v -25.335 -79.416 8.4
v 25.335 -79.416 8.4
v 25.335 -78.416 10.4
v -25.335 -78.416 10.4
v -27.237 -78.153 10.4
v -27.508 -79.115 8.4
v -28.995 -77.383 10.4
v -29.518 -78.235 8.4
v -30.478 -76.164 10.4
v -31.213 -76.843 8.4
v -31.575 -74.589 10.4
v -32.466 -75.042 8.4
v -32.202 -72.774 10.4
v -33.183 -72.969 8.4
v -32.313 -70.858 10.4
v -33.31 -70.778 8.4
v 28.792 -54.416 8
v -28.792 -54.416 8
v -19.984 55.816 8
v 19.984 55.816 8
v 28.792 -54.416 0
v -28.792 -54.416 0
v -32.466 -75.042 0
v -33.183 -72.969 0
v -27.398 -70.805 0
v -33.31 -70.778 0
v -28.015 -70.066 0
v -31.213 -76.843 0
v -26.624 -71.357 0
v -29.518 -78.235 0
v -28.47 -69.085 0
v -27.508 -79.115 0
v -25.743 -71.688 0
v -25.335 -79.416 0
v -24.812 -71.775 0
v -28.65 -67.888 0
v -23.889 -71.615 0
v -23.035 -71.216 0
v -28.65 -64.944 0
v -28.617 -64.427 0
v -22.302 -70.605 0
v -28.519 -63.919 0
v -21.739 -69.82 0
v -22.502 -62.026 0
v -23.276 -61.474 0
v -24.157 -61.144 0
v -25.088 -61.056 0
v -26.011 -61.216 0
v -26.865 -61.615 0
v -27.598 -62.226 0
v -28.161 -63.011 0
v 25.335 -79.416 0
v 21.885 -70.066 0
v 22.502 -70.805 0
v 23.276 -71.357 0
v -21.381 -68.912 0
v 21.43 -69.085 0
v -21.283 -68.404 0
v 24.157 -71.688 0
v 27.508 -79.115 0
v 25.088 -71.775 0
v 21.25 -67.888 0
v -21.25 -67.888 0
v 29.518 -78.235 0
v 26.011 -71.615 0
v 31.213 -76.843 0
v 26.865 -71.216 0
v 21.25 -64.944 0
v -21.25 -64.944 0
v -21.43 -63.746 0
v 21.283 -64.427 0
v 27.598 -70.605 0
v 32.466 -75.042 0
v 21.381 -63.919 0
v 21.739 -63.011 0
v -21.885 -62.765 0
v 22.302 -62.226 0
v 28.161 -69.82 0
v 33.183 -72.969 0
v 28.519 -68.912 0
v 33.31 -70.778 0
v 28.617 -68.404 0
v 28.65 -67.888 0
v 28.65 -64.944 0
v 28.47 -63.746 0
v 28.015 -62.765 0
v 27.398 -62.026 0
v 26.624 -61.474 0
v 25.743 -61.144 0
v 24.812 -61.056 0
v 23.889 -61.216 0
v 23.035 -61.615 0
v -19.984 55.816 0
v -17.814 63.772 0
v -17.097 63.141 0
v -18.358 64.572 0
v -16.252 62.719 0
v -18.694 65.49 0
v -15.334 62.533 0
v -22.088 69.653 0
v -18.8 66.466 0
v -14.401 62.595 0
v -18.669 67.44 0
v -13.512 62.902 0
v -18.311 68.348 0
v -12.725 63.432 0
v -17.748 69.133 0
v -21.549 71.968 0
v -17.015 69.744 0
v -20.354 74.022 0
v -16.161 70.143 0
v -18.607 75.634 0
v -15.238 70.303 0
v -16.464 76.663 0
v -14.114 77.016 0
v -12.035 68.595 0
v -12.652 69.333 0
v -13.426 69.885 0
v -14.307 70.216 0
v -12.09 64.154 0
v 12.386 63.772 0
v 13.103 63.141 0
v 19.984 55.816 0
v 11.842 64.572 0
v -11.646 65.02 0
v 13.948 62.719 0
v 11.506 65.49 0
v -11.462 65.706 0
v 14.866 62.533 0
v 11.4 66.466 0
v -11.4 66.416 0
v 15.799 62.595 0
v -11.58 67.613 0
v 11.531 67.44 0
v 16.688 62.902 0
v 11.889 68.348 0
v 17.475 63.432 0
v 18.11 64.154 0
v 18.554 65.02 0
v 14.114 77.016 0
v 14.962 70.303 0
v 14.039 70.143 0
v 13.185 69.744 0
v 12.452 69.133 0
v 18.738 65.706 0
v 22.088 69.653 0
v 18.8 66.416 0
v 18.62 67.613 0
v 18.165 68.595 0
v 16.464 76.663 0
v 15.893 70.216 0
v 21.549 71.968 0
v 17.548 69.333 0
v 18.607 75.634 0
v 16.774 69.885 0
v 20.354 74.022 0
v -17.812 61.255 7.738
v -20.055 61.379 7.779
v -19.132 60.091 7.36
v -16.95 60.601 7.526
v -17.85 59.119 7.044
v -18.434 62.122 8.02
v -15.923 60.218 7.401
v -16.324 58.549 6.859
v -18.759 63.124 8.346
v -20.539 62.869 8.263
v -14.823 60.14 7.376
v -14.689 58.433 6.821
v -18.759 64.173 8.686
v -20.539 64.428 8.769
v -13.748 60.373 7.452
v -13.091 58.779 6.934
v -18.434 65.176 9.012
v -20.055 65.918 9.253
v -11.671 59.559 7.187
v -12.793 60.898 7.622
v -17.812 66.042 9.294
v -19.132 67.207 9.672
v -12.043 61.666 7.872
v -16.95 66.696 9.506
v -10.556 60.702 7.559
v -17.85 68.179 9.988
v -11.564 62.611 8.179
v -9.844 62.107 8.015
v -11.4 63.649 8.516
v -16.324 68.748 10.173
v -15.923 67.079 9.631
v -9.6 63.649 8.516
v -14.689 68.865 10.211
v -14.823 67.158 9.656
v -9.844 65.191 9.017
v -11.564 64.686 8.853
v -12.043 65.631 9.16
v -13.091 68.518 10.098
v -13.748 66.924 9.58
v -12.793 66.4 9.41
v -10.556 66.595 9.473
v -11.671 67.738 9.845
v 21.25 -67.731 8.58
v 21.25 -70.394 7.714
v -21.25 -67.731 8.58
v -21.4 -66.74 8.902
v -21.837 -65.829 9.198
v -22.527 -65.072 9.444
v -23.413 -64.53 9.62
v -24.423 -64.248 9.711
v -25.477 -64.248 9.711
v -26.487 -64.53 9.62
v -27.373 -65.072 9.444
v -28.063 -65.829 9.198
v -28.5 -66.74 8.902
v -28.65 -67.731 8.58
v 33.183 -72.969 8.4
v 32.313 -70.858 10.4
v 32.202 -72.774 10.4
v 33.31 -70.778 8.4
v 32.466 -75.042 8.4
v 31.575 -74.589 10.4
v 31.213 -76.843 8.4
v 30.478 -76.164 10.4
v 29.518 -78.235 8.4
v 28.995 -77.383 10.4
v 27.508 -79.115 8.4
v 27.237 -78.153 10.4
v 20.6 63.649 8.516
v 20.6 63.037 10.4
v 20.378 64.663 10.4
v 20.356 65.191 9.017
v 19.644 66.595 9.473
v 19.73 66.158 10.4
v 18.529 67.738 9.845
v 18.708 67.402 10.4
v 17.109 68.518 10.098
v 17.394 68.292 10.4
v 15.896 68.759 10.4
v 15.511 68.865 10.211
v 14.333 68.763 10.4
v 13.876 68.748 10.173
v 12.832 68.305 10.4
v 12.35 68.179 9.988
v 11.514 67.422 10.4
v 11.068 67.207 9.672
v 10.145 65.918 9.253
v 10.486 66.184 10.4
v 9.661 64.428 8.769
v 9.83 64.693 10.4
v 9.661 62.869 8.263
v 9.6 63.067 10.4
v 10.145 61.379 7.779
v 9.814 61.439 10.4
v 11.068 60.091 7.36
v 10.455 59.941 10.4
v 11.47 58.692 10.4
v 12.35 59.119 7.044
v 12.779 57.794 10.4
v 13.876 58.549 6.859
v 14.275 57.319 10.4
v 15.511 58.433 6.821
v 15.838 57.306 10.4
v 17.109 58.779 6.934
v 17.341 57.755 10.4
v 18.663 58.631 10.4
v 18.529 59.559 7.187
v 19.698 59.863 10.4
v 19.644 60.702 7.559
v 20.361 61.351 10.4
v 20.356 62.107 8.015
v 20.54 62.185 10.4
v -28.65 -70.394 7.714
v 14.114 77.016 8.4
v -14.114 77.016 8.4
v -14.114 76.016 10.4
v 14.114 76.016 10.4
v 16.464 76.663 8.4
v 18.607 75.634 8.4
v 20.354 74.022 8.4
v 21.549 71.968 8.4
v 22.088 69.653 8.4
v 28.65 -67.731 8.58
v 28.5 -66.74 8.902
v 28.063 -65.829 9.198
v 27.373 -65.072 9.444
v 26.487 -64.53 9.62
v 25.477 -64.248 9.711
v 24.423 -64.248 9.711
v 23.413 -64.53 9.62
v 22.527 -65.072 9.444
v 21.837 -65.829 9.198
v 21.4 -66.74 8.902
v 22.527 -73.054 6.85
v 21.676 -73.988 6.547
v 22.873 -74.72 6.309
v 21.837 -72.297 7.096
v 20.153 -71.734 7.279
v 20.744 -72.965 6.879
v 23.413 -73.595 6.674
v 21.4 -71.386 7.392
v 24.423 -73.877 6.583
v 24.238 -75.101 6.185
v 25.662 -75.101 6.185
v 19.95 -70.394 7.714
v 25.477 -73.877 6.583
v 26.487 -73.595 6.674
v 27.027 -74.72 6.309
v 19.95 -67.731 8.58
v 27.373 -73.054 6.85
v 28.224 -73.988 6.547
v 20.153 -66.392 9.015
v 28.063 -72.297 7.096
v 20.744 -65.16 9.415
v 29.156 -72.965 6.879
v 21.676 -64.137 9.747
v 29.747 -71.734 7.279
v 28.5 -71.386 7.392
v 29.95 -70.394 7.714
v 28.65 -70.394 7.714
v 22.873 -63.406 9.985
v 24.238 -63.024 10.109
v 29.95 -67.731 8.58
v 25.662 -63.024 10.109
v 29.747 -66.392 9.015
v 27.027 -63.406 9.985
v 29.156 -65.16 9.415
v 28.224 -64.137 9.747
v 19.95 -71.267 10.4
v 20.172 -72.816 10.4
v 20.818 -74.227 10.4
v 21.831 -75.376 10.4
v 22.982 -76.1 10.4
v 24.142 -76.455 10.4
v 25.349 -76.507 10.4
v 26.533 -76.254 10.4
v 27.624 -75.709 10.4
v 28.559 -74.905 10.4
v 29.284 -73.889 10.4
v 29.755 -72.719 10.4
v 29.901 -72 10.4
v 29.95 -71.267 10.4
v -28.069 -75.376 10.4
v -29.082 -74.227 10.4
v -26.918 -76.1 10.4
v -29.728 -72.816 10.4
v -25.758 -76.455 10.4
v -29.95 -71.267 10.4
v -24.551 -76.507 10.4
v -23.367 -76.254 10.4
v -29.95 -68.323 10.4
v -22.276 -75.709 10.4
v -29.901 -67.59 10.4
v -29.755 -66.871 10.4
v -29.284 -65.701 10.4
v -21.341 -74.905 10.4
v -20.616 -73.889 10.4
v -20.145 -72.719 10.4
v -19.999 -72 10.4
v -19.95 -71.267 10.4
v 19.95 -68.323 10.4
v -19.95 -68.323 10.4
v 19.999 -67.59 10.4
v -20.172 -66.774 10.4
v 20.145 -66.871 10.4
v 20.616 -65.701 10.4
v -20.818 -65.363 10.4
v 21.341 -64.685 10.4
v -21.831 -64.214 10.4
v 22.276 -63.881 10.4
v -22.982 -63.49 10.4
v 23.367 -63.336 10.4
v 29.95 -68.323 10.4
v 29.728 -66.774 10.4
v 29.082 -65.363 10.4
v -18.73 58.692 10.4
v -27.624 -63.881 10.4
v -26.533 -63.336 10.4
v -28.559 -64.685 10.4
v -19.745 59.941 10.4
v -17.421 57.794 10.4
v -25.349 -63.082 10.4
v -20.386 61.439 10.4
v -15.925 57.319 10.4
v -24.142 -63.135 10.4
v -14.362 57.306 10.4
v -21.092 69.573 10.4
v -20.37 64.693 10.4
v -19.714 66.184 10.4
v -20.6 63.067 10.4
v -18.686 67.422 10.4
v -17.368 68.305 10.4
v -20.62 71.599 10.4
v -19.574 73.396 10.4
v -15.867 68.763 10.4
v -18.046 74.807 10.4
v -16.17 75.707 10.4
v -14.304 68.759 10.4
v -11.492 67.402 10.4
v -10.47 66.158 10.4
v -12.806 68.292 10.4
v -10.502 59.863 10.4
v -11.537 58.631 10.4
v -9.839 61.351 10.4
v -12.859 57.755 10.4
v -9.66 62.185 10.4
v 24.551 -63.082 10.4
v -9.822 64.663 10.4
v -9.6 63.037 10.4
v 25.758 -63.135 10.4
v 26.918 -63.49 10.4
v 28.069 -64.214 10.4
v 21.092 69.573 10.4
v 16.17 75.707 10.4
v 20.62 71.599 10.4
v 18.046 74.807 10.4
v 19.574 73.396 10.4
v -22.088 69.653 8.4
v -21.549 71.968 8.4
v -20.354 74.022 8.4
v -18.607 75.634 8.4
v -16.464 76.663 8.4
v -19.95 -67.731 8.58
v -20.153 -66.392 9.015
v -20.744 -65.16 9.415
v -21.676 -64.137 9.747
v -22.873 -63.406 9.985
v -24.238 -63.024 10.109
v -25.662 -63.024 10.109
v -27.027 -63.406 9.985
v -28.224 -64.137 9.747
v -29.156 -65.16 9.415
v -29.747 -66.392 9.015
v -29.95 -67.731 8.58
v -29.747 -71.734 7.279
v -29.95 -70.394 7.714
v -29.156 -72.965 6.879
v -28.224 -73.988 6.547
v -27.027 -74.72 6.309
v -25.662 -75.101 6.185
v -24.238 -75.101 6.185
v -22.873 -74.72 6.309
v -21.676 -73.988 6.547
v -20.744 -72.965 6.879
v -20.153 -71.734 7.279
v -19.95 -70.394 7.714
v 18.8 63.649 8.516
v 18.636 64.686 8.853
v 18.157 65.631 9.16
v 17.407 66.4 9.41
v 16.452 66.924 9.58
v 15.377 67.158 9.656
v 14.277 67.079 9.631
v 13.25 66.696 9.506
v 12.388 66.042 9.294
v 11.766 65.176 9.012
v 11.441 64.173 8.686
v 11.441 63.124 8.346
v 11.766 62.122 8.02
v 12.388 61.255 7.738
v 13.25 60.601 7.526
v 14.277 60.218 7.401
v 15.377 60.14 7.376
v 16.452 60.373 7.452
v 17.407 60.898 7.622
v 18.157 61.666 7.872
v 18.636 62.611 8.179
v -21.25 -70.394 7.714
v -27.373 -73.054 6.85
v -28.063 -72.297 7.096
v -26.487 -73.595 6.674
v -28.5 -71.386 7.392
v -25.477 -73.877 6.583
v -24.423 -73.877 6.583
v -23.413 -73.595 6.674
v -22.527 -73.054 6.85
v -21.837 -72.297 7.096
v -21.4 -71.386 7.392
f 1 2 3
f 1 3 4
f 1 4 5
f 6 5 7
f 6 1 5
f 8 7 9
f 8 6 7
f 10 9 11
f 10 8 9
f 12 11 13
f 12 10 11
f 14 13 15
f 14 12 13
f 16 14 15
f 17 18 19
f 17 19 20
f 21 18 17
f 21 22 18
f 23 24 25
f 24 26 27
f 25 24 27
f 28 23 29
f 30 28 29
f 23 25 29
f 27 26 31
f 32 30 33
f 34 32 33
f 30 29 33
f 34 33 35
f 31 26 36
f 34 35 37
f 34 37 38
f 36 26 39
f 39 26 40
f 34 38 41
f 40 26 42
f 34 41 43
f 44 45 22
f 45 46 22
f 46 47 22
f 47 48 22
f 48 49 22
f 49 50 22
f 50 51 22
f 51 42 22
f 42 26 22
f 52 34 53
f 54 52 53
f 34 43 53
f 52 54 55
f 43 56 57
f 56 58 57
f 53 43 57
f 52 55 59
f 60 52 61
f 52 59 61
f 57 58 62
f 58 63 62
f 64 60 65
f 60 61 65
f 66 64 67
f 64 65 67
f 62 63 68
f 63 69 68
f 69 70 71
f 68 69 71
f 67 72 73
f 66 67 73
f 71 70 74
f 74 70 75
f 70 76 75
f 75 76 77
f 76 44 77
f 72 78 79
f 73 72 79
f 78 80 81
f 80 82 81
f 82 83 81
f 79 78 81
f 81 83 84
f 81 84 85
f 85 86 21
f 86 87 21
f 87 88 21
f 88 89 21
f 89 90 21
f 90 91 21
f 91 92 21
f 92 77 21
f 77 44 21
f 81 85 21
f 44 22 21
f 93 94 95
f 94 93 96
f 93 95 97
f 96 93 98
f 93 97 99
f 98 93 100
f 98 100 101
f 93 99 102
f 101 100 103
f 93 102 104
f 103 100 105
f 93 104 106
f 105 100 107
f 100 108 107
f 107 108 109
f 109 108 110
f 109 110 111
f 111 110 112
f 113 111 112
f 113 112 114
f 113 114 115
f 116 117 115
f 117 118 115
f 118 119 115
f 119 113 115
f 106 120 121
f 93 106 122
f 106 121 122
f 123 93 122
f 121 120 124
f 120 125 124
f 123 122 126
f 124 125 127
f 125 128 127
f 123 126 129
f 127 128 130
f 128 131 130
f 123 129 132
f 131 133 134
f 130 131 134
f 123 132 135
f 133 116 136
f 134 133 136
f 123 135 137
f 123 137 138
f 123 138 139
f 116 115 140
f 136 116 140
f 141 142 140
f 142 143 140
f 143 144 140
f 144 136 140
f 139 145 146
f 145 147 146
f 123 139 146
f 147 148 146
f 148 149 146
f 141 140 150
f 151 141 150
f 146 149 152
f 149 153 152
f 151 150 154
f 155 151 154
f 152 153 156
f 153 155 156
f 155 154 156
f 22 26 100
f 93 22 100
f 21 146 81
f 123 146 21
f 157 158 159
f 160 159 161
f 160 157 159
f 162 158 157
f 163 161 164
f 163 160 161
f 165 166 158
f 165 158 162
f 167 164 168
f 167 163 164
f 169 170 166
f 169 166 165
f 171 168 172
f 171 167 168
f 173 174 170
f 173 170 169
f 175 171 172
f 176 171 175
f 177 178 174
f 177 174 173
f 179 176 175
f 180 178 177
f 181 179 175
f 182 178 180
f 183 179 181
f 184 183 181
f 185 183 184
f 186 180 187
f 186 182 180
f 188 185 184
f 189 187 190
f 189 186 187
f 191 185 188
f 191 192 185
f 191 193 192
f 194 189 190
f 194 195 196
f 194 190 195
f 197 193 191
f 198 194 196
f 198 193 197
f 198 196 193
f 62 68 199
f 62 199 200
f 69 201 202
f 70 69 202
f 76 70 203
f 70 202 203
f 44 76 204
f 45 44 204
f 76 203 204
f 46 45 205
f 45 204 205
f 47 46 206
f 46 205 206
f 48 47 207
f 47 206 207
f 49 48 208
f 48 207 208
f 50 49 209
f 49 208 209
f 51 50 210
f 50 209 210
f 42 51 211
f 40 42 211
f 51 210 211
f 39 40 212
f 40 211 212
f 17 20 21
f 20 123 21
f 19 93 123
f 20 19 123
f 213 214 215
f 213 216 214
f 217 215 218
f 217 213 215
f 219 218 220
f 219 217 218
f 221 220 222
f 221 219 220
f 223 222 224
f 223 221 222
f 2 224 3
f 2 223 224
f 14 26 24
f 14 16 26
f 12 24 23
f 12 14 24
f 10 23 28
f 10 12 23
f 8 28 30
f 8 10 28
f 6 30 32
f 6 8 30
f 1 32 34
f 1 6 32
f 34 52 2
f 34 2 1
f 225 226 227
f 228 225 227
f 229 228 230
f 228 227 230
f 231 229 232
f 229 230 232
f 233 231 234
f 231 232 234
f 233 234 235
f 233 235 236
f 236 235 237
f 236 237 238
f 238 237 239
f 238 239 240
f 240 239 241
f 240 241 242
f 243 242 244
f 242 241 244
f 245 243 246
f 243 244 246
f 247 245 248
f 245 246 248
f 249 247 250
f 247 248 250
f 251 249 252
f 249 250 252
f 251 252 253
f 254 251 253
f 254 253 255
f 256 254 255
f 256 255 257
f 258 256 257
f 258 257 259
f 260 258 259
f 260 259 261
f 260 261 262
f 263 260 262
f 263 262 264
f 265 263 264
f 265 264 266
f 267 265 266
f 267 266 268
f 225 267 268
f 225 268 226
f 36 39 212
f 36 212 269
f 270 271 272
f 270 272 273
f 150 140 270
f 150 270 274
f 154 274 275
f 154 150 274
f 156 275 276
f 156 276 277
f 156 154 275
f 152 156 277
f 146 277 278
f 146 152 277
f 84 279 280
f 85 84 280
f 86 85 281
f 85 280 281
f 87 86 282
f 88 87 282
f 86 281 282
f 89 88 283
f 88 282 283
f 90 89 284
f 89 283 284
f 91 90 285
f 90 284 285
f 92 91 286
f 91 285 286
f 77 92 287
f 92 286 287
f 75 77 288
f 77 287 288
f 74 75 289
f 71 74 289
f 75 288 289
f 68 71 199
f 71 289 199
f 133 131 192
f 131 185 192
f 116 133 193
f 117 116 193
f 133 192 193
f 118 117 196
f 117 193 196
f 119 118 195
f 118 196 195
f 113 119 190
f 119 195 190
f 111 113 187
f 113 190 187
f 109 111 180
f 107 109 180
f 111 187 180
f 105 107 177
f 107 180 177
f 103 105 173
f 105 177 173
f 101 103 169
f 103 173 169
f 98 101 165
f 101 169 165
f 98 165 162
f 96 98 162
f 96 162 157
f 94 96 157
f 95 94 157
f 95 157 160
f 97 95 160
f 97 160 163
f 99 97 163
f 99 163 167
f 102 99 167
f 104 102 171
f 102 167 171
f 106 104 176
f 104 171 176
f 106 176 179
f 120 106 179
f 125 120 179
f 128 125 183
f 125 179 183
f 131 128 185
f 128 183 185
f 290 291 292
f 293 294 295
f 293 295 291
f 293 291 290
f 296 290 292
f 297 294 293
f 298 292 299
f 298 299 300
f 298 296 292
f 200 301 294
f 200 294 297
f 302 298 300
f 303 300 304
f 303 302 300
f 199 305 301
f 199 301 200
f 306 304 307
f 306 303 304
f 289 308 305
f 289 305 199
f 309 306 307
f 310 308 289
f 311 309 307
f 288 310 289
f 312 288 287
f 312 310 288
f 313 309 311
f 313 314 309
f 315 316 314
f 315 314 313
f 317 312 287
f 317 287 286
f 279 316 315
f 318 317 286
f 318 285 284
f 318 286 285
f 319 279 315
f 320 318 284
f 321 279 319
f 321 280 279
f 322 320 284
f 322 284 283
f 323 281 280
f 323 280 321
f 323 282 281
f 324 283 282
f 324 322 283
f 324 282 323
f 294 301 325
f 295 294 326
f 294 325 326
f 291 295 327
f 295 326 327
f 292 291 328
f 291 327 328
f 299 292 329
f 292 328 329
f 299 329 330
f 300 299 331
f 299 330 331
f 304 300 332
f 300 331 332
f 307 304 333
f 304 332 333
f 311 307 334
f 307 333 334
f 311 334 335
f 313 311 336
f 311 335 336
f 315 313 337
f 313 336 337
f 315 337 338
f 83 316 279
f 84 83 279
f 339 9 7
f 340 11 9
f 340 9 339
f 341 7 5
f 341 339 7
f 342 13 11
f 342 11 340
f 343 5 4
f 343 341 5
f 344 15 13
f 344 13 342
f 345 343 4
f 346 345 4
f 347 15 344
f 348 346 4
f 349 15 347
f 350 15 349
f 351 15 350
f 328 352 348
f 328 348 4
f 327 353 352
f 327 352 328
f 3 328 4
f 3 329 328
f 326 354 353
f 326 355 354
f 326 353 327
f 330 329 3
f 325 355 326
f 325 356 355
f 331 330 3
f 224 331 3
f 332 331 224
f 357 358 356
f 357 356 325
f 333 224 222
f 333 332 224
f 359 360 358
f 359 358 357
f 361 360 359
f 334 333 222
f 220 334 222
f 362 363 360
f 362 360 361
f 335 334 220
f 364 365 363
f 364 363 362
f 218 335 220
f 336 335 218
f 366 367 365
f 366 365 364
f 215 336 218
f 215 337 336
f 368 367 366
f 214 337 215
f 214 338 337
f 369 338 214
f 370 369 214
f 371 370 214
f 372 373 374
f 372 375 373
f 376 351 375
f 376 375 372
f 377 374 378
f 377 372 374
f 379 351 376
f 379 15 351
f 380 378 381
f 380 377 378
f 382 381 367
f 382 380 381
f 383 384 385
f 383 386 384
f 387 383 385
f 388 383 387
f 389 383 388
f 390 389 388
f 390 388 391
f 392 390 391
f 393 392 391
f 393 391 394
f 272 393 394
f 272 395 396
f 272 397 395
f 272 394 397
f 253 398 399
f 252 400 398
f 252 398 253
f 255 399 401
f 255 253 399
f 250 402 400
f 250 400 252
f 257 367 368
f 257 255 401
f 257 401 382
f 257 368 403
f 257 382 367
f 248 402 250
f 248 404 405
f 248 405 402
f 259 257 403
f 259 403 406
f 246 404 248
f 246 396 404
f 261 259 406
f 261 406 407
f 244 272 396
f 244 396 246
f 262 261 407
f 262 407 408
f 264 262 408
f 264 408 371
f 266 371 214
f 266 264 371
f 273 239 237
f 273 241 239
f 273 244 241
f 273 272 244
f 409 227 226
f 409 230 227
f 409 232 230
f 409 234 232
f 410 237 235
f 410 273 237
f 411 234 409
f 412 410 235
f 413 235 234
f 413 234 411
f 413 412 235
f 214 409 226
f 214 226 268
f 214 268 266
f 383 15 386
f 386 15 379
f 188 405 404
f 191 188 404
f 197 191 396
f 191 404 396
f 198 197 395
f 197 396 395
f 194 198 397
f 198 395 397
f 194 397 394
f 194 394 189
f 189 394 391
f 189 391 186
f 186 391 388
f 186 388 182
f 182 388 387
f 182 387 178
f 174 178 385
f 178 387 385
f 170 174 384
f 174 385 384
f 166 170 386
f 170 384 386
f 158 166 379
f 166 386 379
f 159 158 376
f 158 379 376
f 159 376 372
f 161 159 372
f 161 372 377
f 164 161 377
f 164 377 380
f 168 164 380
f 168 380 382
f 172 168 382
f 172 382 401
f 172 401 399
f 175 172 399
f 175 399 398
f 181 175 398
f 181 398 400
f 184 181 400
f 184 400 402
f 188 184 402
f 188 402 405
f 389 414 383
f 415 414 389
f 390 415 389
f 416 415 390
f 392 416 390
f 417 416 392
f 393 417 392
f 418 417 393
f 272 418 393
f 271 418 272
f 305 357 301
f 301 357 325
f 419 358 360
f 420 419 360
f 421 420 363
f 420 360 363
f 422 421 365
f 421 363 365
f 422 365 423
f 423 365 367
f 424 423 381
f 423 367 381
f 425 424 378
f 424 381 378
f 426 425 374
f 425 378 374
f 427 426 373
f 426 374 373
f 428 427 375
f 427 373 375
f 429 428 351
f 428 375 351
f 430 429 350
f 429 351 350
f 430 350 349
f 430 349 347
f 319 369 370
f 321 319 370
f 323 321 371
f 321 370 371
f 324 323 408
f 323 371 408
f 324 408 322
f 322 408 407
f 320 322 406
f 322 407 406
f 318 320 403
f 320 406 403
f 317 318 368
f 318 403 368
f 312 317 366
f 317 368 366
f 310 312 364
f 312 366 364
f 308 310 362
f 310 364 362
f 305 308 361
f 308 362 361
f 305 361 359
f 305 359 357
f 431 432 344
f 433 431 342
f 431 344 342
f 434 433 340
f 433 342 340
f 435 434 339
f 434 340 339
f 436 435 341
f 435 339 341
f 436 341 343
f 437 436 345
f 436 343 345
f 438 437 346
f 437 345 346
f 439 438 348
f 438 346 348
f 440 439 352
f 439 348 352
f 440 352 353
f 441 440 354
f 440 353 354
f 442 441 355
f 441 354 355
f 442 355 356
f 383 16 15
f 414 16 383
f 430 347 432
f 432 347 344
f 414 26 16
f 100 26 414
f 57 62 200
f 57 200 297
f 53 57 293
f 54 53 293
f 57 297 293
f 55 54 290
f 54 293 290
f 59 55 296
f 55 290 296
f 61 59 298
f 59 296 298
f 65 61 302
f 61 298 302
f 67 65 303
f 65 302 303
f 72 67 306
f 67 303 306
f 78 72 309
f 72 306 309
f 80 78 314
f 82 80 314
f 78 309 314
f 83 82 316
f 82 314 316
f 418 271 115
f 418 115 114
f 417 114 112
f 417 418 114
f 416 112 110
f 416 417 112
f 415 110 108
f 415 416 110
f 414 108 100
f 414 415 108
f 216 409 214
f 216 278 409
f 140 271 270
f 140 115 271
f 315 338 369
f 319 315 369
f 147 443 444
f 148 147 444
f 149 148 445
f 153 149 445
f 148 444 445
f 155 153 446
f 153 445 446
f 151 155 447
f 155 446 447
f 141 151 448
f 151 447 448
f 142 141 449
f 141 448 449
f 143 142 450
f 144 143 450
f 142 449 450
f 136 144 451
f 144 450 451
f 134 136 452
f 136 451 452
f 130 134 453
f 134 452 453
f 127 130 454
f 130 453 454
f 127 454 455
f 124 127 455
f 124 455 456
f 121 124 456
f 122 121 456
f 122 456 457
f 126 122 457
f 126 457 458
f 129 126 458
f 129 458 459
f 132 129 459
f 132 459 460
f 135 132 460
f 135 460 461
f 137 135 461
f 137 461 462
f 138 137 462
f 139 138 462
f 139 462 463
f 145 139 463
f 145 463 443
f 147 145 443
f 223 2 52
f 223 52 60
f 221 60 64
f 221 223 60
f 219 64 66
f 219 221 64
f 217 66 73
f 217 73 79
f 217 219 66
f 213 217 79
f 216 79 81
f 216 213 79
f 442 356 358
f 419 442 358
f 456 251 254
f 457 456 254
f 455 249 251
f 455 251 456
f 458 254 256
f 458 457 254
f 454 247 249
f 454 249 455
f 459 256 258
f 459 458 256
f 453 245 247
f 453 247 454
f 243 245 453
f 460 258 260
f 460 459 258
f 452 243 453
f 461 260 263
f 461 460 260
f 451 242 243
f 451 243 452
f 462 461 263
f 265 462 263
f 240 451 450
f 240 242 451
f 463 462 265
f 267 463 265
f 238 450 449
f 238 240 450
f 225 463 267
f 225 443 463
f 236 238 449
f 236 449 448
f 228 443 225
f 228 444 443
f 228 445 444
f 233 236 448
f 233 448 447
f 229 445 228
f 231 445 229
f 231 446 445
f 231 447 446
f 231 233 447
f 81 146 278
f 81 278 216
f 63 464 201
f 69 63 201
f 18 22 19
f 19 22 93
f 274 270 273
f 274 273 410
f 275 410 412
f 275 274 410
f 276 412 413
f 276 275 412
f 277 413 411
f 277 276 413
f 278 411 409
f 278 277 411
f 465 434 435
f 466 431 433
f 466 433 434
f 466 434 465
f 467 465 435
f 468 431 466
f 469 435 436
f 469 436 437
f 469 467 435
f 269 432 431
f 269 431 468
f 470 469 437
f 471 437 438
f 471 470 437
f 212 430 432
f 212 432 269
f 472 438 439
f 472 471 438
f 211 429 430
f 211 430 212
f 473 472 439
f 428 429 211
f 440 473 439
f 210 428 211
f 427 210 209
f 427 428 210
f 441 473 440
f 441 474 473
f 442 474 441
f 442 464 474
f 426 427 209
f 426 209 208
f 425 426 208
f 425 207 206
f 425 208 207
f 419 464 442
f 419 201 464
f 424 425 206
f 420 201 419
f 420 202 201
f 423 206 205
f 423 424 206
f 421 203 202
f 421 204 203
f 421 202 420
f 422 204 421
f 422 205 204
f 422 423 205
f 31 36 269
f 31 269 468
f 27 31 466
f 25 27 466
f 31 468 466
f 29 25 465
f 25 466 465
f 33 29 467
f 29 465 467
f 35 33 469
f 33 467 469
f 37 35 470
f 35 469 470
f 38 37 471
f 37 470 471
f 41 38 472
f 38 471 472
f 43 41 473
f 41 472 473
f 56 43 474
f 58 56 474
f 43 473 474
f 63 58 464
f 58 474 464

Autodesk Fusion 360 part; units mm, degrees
sketch "Sketch1" plane through (0, 0, 0) normal (0, 0, 1) x (1, 0, 0)
  circle A0 centre (-15.1, 66.4157) radius 3.6
  circle A1 centre (15.1, 66.4157) radius 3.6
  line L0 (-21.35, -67.8157) -> (-21.35, -65.0157)
  arc A2 (-21.35, -65.0157) -> (-28.55, -65.0157) centre (-24.95, -65.0157) ccw
  line L1 (-28.55, -65.0157) -> (-28.55, -67.8157)
  arc A3 (-28.55, -67.8157) -> (-21.35, -67.8157) centre (-24.95, -67.8157) ccw
  line L2 (-24.95, -67.8157) -> (-24.95, -65.0157) construction
  line L3 (28.55, -67.8157) -> (28.55, -65.0157)
  arc A4 (28.55, -65.0157) -> (21.35, -65.0157) centre (24.95, -65.0157) ccw
  line L4 (21.35, -65.0157) -> (21.35, -67.8157)
  arc A5 (21.35, -67.8157) -> (28.55, -67.8157) centre (24.95, -67.8157) ccw
  line L5 (24.95, -67.8157) -> (24.95, -65.0157) construction
  line L6 (21.35, -66.4157) -> (-21.35, -66.4157) construction
  line L7 (0, 0) -> (0, -66.4157) construction
  line L8 (0, 0) -> (0, 66.4157) construction
  line L9 (-11.5, 66.4157) -> (11.5, 66.4157) construction
  line L10 (11.5, 62.5719) -> (11.5, 70.0303) construction
  line L11 (-11.5, 69.0679) -> (-11.5, 63.414) construction
  line L12 (-21.5, 77.0157) -> (21.5, 77.0157)
  line L13 (21.5, 77.0157) -> (34, -79.4157)
  line L14 (34, -79.4157) -> (-34, -79.4157)
  line L15 (-34, -79.4157) -> (-21.5, 77.0157)
  line L16 (-30.5341, -76.2157) -> (-18.5455, 73.8157)
  line L17 (-18.5455, 73.8157) -> (18.5455, 73.8157)
  line L18 (18.5455, 73.8157) -> (30.5341, -76.2157)
  line L19 (30.5341, -76.2157) -> (-30.5341, -76.2157)
  line L20 (-23.194, 55.8157) -> (23.194, 55.8157)
  line L21 (-32.0023, -54.4157) -> (32.0023, -54.4157)
  line L22 (-23.4497, 52.6157) -> (23.4497, 52.6157)
  line L23 (-31.7466, -51.2157) -> (31.7466, -51.2157)
  point P0 (-24.95, -66.4157)
  point P1 (24.95, -66.4157)
  dimension "d1" = 7.2
  dimension "d2" = 7.2
  dimension "d3" = 7.2
  dimension "d4" = 7.2
  dimension "d5" = 10
  dimension "d6" = 10
  dimension "d8" = 42.7
  dimension "d9" = 23
  dimension "d10" = 124.6
  dimension "d11" = 43
  dimension "d12" = 21.5
  dimension "d13" = 68
  dimension "d14" = 34
  dimension "d15" = 7
  dimension "d16" = 8
  dimension "d17" = 3.2
  dimension "d19" = 7
  dimension "d20" = 7
  dimension "d23" = 3.2
  dimension "d24" = 3.2
extrude "Extrude1" add sketch "Sketch1" along normal blind 8 contours A0 | A1 | L0 A2 L1 A3 | L3 A4 L4 A5 | L12 L13 L15 L16 L17 L18 L20 | L15 L16 L20 L22 | L13 L18 L20 L22 | L15 L16 L22 L23 | L16 L17 L18 L20 | L13 L18 L22 L23 | L15 L16 L21 L23 | L13 L18 L21 L23 | L13 L14 L15 L16 L18 L19 L21 | L16 L18 L19 L21
extrude "Extrude5" add sketch "Sketch1" along normal blind 2.4 from surface at 8 contours A0 | A1 | L0 A2 L1 A3 | L3 A4 L4 A5 | L12 L13 L15 L16 L17 L18 L20 | L15 L16 L20 L22 | L13 L18 L20 L22 | L15 L16 L22 L23 | L16 L18 L20 L22 | L16 L17 L18 L20 | L13 L18 L22 L23 | L15 L16 L21 L23 | L16 L18 L22 L23 | L13 L18 L21 L23 | L13 L14 L15 L16 L18 L19 L21 | L16 L18 L21 L23 | L16 L18 L19 L21
fillet "Fillet2" radius 8 4 edges at (-34, -79.4157, 5.2) (34, -79.4157, 5.2) (21.5, 77.0157, 5.2) (-21.5, 77.0157, 5.2)
chamfer "Chamfer3" distance 1 distance2 2 8 edges at (-27.6991, -0.5628, 10.4) (-31.2131, -76.8426, 10.4) (0, -79.4157, 10.4) (31.2131, -76.8426, 10.4) (27.6991, -0.5628, 10.4) (19.5406, 74.8935, 10.4) (0, 77.0157, 10.4) (-19.5406, 74.8935, 10.4) measured on face at (7.3628, -23.968, 10.4) measured on face at (-25.7019, -79.4073, 3.4667) measured on face at (7.3628, -23.968, 10.4) measured on face at (33.246, -72.6073, 3.4667) measured on face at (7.3628, -23.968, 10.4) measured on face at (20.0972, 74.326, 6.9333) measured on face at (7.3628, -23.968, 10.4) measured on face at (-20.8196, 73.3782, 3.4667)
sketch "Sketch3" plane through (0, 0, 0) normal (1, 0, 0) x (0, 1, 0)
  line L0 (66.4157, 0) -> (58.8029, 23.4298)
  line L1 (-66.4157, 0) -> (-75.3617, 27.5331)
  line L2 (-67.8157, 0) -> (-65.0157, 0)
  line L3 (70.0157, 0) -> (62.8157, 0)
  dimension "d47" = 72
  dimension "d50" = 72
ref_plane "WorkPlane1" through (0, 60.3722, 18.6001) normal (0, -0.309, 0.9511) x (1, 0, 0)
sketch "Sketch4" plane through (0, 60.3722, 18.6001) normal (0, -0.309, 0.9511) x (1, 0, 0)
  ellipse E0 centre (15.1, 0) end of major axis (18.7, 0) minor radius 3.4238
  ellipse E1 centre (-15.1, 0) end of major axis (-11.5, 0) minor radius 3.4238
  circle A0 centre (15.1, 0) radius 3.7
  circle A1 centre (-15.1, 0) radius 3.7
  dimension "d64" = 7.4
  dimension "d65" = 7.4
extrude "Extrude6" cut sketch "Sketch4" against normal through all contours E0 | E1 | A0 | A1
ref_plane "WorkPlane2" through (0, -74.6951, 25.4815) normal (0, -0.309, 0.9511) x (1, 0, 0)
sketch "Sketch5" plane through (0, -74.6951, 25.4815) normal (0, -0.309, 0.9511) x (1, 0, 0)
  line L0 (28.65, -1.4) -> (28.65, 1.4)
  arc A0 (28.65, 1.4) -> (21.25, 1.4) centre (24.95, 1.4) ccw
  line L1 (21.25, 1.4) -> (21.25, -1.4)
  arc A1 (21.25, -1.4) -> (28.65, -1.4) centre (24.95, -1.4) ccw
  line L2 (24.95, -1.4) -> (24.95, 1.4) construction
  line L3 (-21.25, -1.4) -> (-21.25, 1.4)
  arc A2 (-21.25, 1.4) -> (-28.65, 1.4) centre (-24.95, 1.4) ccw
  line L4 (-28.65, 1.4) -> (-28.65, -1.4)
  arc A3 (-28.65, -1.4) -> (-21.25, -1.4) centre (-24.95, -1.4) ccw
  line L5 (-24.95, -1.4) -> (-24.95, 1.4) construction
  point P0 (24.95, 0)
  point P1 (-24.95, 0)
  point P2 (24.95, 0)
  point P3 (-24.95, 0)
  dimension "d69" = 7.4
  dimension "d70" = 7.4
  dimension "d71" = 10.2
  dimension "d72" = 10.2
extrude "Extrude7" cut sketch "Sketch5" against normal through all
sketch "Sketch6" plane through (0, 60.3722, 18.6001) normal (0, -0.309, 0.9511) x (1, 0, 0)
  ellipse E0 centre (-15.1, 0) end of major axis (-11.5, 0) minor radius 3.4238
  ellipse E1 centre (15.1, 0) end of major axis (18.7, 0) minor radius 3.4238
  circle A0 centre (-15.1, 0) radius 5.5
  circle A1 centre (15.1, 0) radius 5.5
  dimension "d75" = 11
  dimension "d76" = 11
extrude "Extrude8" cut sketch "Sketch6" against normal blind 10.603 contours E0 | E1 | A0 | A1
sketch "Sketch7" plane through (0, -74.6951, 25.4815) normal (0, -0.309, 0.9511) x (1, 0, 0)
  arc A0 (-21.25, 1.4) -> (-28.65, 1.4) centre (-24.95, 1.4) ccw
  line L0 (-21.25, -1.4) -> (-21.25, 1.4)
  arc A1 (-28.65, -1.4) -> (-21.25, -1.4) centre (-24.95, -1.4) ccw
  line L1 (-28.65, 1.4) -> (-28.65, -1.4)
  arc A2 (28.65, 1.4) -> (21.25, 1.4) centre (24.95, 1.4) ccw
  line L2 (21.25, 1.4) -> (21.25, -1.4)
  arc A3 (21.25, -1.4) -> (28.65, -1.4) centre (24.95, -1.4) ccw
  line L3 (28.65, -1.4) -> (28.65, 1.4)
  line L4 (-19.95, -1.4) -> (-19.95, 1.4)
  arc A4 (-19.95, 1.4) -> (-29.95, 1.4) centre (-24.95, 1.4) ccw
  line L5 (-29.95, 1.4) -> (-29.95, -1.4)
  arc A5 (-29.95, -1.4) -> (-19.95, -1.4) centre (-24.95, -1.4) ccw
  line L6 (29.95, -1.4) -> (29.95, 1.4)
  arc A6 (29.95, 1.4) -> (19.95, 1.4) centre (24.95, 1.4) ccw
  line L7 (19.95, 1.4) -> (19.95, -1.4)
  arc A7 (19.95, -1.4) -> (29.95, -1.4) centre (24.95, -1.4) ccw
  dimension "d79" = 1.3
  dimension "d80" = 10
  dimension "d81" = 1.3
extrude "Extrude9" cut sketch "Sketch7" against normal blind 18.2266 contours A0 L0 A1 L1 | A2 L2 A3 L3 | L4 A4 L5 A5 | L6 A6 L7 A7
equation "d2 = d1"
equation "d12 = d11 / 2"
equation "d14 = d13 / 2"
equation "d17 = ( 0.4 * 8 ) * 1 mm"
equation "d23 = d17"
equation "d24 = d17"
equation "d47 = 90 deg - 18 deg"
equation "d50 = d47"
equation "d64 = d65"
equation "d70 = d69"
equation "d72 = d71"
equation "d76 = d75"
equation "d81 = d79"
